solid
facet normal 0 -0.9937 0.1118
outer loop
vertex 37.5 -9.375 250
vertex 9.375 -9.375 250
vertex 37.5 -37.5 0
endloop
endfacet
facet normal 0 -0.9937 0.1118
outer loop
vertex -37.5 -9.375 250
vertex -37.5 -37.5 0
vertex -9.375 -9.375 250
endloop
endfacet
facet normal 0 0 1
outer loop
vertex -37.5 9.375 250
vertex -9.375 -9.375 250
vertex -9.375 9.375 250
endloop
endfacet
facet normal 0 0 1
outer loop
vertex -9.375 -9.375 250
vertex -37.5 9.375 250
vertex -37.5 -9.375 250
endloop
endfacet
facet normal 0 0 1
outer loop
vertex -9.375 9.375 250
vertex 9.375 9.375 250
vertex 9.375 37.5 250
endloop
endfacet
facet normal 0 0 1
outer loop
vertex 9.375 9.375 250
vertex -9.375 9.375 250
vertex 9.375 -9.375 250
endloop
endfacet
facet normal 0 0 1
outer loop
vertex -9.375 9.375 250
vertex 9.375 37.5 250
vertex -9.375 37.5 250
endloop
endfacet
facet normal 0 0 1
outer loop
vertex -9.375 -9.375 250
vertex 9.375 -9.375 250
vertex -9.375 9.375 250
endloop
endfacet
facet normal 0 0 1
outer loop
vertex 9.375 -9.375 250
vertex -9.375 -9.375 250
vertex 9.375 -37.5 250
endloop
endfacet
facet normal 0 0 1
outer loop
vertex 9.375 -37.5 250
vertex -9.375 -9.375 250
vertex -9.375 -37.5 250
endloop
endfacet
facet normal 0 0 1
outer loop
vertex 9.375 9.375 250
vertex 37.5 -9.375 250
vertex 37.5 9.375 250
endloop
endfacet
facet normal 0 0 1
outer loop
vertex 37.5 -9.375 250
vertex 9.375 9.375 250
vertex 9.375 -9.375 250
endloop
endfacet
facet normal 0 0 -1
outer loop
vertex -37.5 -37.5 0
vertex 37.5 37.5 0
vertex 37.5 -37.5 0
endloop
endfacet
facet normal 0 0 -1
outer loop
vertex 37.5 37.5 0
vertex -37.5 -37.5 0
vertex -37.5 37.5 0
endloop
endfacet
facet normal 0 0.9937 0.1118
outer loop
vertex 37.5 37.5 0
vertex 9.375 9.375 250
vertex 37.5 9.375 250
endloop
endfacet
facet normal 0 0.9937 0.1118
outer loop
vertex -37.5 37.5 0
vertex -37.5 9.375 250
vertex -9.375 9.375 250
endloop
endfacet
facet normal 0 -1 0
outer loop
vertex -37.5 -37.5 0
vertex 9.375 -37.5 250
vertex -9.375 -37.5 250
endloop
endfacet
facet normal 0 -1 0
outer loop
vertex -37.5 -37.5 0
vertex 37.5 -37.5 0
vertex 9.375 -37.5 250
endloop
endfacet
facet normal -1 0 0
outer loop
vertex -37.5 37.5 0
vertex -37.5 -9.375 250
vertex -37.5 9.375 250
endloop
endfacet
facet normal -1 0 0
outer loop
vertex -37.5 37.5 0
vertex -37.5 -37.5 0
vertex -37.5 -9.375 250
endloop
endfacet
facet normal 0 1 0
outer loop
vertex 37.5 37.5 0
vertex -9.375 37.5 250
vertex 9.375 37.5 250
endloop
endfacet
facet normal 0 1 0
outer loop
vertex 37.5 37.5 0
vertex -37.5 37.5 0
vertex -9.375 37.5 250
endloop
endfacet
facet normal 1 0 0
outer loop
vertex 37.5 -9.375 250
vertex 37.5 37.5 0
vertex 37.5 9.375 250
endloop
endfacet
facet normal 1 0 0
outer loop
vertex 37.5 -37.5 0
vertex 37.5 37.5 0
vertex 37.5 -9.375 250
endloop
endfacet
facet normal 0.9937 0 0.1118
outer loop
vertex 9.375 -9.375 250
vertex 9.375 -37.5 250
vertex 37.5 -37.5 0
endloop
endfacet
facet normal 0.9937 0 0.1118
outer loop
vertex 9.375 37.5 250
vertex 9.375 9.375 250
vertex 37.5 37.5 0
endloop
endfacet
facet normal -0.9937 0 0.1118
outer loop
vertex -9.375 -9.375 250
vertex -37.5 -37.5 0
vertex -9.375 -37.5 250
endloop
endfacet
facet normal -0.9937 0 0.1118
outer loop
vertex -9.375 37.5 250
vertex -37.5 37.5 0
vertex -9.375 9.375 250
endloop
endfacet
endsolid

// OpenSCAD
Taille=100;
RC=Taille*75/100;
PC=Taille/2;
Vue="Roi";//[Roi,Reine,Fou,Cavalier,Tour,Pion,Tout]
if(Vue=="Tout")
{
translate([-Taille*4,0,0])
roi();
translate([-Taille*3,0,0])
reine();
translate([-Taille*2,0,0])
fou();
translate([-Taille*1,0,0])
cavalier();
tour();
translate([Taille*1,0,0])
pion();}

if(Vue=="Roi"){roi();}
if(Vue=="Reine"){reine();}
if(Vue=="Fou"){fou();}
if(Vue=="Cavalier"){cavalier();}
if(Vue=="Tour"){tour();}
if(Vue=="Pion"){pion();}


module roi()
{
  union()
  {
  hull()
  {
    cube([RC,RC,0.00001],center=true);
    translate([0,0,Taille*2.5])
    cube([RC,RC/4,0.00001],center=true)  ;
  }
  hull()
  {
    cube([RC,RC,0.00001],center=true);
    translate([0,0,Taille*2.5])
    cube([RC/4,RC,0.00001],center=true)  ;
  }
}
}
module reine()
{
  union()
  {
    {
      for(i=[1:8])
      {
        hull()
        {
        cube([RC,RC,0.00001],center=true);
        translate([sin(360/8*i)*(RC/2-11),cos(360/8*i)*(RC/2-11),Taille*2.5-RC/2])
        {
          sphere(d=22,$fn=64);
        }
        }
      }
    }
  }  
}

module fou()
{
  union()
  {
  difference()
  {
    hull()
    {
      cube([RC,RC,0.00001],center=true);
      translate([0,0,Taille*2-RC/2])
      {
        sphere(r = RC/4,$fn=64);
        translate([0, 0, RC/4 * sin(RC/3)])
        cylinder(h = RC/3, r1 =  RC/4 * cos(RC/3), r2 = 0,$fn=64);
      }
    }
    translate([0,0,Taille*2-RC/2])
    difference()
    {
      cylinder(d=RC/3,h=Taille*2);
      cylinder(d=RC/4,h=Taille*3);
    }
  }
}
}
module cavalier()
{
  union()
  {
  hull()
  {
  cube([RC,RC,0.00001],center=true);
  translate([0,RC/4,Taille*2-RC/2])
  rotate([90,0,90])
  scale([0.5,1,1])
  cylinder(d=RC,h=RC/16,$fn=64,center=true);
  }
  hull()
  {
  translate([0,RC/4,Taille*2-RC/2])
  rotate([90,0,90])
  scale([0.5,1,1])
  cylinder(d=RC/4*3,h=RC/4,$fn=64,center=true);

  translate([0,-RC/4,Taille*2-RC])
  rotate([90,0,90])
  scale([0.5,0.5,1])
  cylinder(d=RC/4*3,h=RC/8,$fn=64,center=true);
  }
}

}

module tour()
{
  union()
  {
  hull()
  {
    cube([RC,RC,0.00001],center=true);
    translate([RC/3,RC/3,Taille*2.25])  
    cube([RC/3,RC/3,0.00001],center=true);
  }

  hull()
  {
    cube([RC,RC,0.00001],center=true);
    translate([RC/3,-RC/3,Taille*2.25])  
    cube([RC/3,RC/3,0.00001],center=true);
  }
  hull()
  {
    cube([RC,RC,0.00001],center=true);
    translate([-RC/3,RC/3,Taille*2.25])  
    cube([RC/3,RC/3,0.00001],center=true);
  }

  hull()
  {
    cube([RC,RC,0.00001],center=true);
    translate([-RC/3,-RC/3,Taille*2.25])  
    cube([RC/3,RC/3,0.00001],center=true);
  }
}
  
}

module pion()
{
  hull()
  {
    cube([PC,PC,0.00001],center=true);
    translate([0,0,Taille*1.25-PC/2])
    sphere(d=PC,$fn=64);
  }
}
